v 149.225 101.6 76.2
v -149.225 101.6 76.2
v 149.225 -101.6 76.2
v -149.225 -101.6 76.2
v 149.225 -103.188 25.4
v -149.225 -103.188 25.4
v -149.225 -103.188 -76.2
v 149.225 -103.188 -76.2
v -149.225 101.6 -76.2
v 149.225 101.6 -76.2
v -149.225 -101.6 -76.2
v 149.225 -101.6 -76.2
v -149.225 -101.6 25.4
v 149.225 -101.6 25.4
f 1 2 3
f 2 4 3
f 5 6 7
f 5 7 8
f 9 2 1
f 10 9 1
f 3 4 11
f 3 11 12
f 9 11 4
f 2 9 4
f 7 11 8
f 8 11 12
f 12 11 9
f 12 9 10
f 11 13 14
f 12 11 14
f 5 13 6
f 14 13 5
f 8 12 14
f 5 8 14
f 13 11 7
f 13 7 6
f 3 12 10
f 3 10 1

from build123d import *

# Parameters (mm, degrees)
F0_W     = 298.45
F0_H     = 152.4
F1_DEPTH = 101.6
F2_W     = 298.45
F2_H     = 101.6
F3_DEPTH = 1.5875


# Not quite as in the source:
# - a length typed as a fraction of an inch, garbled in the dataset ("3 / 203.2 mm" for 3/8 in), is restored


with BuildPart() as f1:
    # F0 (on Front) → F1 (new body, symmetric)
    with BuildSketch(Plane.XZ):
        Rectangle(F0_W, F0_H)
    extrude(amount=F1_DEPTH, both=True)


with BuildPart() as f3:
    # F2 (on face) → F3 (new body)
    with BuildSketch(Plane.XZ.offset(101.6)):
        with Locations((0, -25.4)):
            Rectangle(F2_W, F2_H)
    extrude(amount=F3_DEPTH)


solid = Compound([f1.part, f3.part])
